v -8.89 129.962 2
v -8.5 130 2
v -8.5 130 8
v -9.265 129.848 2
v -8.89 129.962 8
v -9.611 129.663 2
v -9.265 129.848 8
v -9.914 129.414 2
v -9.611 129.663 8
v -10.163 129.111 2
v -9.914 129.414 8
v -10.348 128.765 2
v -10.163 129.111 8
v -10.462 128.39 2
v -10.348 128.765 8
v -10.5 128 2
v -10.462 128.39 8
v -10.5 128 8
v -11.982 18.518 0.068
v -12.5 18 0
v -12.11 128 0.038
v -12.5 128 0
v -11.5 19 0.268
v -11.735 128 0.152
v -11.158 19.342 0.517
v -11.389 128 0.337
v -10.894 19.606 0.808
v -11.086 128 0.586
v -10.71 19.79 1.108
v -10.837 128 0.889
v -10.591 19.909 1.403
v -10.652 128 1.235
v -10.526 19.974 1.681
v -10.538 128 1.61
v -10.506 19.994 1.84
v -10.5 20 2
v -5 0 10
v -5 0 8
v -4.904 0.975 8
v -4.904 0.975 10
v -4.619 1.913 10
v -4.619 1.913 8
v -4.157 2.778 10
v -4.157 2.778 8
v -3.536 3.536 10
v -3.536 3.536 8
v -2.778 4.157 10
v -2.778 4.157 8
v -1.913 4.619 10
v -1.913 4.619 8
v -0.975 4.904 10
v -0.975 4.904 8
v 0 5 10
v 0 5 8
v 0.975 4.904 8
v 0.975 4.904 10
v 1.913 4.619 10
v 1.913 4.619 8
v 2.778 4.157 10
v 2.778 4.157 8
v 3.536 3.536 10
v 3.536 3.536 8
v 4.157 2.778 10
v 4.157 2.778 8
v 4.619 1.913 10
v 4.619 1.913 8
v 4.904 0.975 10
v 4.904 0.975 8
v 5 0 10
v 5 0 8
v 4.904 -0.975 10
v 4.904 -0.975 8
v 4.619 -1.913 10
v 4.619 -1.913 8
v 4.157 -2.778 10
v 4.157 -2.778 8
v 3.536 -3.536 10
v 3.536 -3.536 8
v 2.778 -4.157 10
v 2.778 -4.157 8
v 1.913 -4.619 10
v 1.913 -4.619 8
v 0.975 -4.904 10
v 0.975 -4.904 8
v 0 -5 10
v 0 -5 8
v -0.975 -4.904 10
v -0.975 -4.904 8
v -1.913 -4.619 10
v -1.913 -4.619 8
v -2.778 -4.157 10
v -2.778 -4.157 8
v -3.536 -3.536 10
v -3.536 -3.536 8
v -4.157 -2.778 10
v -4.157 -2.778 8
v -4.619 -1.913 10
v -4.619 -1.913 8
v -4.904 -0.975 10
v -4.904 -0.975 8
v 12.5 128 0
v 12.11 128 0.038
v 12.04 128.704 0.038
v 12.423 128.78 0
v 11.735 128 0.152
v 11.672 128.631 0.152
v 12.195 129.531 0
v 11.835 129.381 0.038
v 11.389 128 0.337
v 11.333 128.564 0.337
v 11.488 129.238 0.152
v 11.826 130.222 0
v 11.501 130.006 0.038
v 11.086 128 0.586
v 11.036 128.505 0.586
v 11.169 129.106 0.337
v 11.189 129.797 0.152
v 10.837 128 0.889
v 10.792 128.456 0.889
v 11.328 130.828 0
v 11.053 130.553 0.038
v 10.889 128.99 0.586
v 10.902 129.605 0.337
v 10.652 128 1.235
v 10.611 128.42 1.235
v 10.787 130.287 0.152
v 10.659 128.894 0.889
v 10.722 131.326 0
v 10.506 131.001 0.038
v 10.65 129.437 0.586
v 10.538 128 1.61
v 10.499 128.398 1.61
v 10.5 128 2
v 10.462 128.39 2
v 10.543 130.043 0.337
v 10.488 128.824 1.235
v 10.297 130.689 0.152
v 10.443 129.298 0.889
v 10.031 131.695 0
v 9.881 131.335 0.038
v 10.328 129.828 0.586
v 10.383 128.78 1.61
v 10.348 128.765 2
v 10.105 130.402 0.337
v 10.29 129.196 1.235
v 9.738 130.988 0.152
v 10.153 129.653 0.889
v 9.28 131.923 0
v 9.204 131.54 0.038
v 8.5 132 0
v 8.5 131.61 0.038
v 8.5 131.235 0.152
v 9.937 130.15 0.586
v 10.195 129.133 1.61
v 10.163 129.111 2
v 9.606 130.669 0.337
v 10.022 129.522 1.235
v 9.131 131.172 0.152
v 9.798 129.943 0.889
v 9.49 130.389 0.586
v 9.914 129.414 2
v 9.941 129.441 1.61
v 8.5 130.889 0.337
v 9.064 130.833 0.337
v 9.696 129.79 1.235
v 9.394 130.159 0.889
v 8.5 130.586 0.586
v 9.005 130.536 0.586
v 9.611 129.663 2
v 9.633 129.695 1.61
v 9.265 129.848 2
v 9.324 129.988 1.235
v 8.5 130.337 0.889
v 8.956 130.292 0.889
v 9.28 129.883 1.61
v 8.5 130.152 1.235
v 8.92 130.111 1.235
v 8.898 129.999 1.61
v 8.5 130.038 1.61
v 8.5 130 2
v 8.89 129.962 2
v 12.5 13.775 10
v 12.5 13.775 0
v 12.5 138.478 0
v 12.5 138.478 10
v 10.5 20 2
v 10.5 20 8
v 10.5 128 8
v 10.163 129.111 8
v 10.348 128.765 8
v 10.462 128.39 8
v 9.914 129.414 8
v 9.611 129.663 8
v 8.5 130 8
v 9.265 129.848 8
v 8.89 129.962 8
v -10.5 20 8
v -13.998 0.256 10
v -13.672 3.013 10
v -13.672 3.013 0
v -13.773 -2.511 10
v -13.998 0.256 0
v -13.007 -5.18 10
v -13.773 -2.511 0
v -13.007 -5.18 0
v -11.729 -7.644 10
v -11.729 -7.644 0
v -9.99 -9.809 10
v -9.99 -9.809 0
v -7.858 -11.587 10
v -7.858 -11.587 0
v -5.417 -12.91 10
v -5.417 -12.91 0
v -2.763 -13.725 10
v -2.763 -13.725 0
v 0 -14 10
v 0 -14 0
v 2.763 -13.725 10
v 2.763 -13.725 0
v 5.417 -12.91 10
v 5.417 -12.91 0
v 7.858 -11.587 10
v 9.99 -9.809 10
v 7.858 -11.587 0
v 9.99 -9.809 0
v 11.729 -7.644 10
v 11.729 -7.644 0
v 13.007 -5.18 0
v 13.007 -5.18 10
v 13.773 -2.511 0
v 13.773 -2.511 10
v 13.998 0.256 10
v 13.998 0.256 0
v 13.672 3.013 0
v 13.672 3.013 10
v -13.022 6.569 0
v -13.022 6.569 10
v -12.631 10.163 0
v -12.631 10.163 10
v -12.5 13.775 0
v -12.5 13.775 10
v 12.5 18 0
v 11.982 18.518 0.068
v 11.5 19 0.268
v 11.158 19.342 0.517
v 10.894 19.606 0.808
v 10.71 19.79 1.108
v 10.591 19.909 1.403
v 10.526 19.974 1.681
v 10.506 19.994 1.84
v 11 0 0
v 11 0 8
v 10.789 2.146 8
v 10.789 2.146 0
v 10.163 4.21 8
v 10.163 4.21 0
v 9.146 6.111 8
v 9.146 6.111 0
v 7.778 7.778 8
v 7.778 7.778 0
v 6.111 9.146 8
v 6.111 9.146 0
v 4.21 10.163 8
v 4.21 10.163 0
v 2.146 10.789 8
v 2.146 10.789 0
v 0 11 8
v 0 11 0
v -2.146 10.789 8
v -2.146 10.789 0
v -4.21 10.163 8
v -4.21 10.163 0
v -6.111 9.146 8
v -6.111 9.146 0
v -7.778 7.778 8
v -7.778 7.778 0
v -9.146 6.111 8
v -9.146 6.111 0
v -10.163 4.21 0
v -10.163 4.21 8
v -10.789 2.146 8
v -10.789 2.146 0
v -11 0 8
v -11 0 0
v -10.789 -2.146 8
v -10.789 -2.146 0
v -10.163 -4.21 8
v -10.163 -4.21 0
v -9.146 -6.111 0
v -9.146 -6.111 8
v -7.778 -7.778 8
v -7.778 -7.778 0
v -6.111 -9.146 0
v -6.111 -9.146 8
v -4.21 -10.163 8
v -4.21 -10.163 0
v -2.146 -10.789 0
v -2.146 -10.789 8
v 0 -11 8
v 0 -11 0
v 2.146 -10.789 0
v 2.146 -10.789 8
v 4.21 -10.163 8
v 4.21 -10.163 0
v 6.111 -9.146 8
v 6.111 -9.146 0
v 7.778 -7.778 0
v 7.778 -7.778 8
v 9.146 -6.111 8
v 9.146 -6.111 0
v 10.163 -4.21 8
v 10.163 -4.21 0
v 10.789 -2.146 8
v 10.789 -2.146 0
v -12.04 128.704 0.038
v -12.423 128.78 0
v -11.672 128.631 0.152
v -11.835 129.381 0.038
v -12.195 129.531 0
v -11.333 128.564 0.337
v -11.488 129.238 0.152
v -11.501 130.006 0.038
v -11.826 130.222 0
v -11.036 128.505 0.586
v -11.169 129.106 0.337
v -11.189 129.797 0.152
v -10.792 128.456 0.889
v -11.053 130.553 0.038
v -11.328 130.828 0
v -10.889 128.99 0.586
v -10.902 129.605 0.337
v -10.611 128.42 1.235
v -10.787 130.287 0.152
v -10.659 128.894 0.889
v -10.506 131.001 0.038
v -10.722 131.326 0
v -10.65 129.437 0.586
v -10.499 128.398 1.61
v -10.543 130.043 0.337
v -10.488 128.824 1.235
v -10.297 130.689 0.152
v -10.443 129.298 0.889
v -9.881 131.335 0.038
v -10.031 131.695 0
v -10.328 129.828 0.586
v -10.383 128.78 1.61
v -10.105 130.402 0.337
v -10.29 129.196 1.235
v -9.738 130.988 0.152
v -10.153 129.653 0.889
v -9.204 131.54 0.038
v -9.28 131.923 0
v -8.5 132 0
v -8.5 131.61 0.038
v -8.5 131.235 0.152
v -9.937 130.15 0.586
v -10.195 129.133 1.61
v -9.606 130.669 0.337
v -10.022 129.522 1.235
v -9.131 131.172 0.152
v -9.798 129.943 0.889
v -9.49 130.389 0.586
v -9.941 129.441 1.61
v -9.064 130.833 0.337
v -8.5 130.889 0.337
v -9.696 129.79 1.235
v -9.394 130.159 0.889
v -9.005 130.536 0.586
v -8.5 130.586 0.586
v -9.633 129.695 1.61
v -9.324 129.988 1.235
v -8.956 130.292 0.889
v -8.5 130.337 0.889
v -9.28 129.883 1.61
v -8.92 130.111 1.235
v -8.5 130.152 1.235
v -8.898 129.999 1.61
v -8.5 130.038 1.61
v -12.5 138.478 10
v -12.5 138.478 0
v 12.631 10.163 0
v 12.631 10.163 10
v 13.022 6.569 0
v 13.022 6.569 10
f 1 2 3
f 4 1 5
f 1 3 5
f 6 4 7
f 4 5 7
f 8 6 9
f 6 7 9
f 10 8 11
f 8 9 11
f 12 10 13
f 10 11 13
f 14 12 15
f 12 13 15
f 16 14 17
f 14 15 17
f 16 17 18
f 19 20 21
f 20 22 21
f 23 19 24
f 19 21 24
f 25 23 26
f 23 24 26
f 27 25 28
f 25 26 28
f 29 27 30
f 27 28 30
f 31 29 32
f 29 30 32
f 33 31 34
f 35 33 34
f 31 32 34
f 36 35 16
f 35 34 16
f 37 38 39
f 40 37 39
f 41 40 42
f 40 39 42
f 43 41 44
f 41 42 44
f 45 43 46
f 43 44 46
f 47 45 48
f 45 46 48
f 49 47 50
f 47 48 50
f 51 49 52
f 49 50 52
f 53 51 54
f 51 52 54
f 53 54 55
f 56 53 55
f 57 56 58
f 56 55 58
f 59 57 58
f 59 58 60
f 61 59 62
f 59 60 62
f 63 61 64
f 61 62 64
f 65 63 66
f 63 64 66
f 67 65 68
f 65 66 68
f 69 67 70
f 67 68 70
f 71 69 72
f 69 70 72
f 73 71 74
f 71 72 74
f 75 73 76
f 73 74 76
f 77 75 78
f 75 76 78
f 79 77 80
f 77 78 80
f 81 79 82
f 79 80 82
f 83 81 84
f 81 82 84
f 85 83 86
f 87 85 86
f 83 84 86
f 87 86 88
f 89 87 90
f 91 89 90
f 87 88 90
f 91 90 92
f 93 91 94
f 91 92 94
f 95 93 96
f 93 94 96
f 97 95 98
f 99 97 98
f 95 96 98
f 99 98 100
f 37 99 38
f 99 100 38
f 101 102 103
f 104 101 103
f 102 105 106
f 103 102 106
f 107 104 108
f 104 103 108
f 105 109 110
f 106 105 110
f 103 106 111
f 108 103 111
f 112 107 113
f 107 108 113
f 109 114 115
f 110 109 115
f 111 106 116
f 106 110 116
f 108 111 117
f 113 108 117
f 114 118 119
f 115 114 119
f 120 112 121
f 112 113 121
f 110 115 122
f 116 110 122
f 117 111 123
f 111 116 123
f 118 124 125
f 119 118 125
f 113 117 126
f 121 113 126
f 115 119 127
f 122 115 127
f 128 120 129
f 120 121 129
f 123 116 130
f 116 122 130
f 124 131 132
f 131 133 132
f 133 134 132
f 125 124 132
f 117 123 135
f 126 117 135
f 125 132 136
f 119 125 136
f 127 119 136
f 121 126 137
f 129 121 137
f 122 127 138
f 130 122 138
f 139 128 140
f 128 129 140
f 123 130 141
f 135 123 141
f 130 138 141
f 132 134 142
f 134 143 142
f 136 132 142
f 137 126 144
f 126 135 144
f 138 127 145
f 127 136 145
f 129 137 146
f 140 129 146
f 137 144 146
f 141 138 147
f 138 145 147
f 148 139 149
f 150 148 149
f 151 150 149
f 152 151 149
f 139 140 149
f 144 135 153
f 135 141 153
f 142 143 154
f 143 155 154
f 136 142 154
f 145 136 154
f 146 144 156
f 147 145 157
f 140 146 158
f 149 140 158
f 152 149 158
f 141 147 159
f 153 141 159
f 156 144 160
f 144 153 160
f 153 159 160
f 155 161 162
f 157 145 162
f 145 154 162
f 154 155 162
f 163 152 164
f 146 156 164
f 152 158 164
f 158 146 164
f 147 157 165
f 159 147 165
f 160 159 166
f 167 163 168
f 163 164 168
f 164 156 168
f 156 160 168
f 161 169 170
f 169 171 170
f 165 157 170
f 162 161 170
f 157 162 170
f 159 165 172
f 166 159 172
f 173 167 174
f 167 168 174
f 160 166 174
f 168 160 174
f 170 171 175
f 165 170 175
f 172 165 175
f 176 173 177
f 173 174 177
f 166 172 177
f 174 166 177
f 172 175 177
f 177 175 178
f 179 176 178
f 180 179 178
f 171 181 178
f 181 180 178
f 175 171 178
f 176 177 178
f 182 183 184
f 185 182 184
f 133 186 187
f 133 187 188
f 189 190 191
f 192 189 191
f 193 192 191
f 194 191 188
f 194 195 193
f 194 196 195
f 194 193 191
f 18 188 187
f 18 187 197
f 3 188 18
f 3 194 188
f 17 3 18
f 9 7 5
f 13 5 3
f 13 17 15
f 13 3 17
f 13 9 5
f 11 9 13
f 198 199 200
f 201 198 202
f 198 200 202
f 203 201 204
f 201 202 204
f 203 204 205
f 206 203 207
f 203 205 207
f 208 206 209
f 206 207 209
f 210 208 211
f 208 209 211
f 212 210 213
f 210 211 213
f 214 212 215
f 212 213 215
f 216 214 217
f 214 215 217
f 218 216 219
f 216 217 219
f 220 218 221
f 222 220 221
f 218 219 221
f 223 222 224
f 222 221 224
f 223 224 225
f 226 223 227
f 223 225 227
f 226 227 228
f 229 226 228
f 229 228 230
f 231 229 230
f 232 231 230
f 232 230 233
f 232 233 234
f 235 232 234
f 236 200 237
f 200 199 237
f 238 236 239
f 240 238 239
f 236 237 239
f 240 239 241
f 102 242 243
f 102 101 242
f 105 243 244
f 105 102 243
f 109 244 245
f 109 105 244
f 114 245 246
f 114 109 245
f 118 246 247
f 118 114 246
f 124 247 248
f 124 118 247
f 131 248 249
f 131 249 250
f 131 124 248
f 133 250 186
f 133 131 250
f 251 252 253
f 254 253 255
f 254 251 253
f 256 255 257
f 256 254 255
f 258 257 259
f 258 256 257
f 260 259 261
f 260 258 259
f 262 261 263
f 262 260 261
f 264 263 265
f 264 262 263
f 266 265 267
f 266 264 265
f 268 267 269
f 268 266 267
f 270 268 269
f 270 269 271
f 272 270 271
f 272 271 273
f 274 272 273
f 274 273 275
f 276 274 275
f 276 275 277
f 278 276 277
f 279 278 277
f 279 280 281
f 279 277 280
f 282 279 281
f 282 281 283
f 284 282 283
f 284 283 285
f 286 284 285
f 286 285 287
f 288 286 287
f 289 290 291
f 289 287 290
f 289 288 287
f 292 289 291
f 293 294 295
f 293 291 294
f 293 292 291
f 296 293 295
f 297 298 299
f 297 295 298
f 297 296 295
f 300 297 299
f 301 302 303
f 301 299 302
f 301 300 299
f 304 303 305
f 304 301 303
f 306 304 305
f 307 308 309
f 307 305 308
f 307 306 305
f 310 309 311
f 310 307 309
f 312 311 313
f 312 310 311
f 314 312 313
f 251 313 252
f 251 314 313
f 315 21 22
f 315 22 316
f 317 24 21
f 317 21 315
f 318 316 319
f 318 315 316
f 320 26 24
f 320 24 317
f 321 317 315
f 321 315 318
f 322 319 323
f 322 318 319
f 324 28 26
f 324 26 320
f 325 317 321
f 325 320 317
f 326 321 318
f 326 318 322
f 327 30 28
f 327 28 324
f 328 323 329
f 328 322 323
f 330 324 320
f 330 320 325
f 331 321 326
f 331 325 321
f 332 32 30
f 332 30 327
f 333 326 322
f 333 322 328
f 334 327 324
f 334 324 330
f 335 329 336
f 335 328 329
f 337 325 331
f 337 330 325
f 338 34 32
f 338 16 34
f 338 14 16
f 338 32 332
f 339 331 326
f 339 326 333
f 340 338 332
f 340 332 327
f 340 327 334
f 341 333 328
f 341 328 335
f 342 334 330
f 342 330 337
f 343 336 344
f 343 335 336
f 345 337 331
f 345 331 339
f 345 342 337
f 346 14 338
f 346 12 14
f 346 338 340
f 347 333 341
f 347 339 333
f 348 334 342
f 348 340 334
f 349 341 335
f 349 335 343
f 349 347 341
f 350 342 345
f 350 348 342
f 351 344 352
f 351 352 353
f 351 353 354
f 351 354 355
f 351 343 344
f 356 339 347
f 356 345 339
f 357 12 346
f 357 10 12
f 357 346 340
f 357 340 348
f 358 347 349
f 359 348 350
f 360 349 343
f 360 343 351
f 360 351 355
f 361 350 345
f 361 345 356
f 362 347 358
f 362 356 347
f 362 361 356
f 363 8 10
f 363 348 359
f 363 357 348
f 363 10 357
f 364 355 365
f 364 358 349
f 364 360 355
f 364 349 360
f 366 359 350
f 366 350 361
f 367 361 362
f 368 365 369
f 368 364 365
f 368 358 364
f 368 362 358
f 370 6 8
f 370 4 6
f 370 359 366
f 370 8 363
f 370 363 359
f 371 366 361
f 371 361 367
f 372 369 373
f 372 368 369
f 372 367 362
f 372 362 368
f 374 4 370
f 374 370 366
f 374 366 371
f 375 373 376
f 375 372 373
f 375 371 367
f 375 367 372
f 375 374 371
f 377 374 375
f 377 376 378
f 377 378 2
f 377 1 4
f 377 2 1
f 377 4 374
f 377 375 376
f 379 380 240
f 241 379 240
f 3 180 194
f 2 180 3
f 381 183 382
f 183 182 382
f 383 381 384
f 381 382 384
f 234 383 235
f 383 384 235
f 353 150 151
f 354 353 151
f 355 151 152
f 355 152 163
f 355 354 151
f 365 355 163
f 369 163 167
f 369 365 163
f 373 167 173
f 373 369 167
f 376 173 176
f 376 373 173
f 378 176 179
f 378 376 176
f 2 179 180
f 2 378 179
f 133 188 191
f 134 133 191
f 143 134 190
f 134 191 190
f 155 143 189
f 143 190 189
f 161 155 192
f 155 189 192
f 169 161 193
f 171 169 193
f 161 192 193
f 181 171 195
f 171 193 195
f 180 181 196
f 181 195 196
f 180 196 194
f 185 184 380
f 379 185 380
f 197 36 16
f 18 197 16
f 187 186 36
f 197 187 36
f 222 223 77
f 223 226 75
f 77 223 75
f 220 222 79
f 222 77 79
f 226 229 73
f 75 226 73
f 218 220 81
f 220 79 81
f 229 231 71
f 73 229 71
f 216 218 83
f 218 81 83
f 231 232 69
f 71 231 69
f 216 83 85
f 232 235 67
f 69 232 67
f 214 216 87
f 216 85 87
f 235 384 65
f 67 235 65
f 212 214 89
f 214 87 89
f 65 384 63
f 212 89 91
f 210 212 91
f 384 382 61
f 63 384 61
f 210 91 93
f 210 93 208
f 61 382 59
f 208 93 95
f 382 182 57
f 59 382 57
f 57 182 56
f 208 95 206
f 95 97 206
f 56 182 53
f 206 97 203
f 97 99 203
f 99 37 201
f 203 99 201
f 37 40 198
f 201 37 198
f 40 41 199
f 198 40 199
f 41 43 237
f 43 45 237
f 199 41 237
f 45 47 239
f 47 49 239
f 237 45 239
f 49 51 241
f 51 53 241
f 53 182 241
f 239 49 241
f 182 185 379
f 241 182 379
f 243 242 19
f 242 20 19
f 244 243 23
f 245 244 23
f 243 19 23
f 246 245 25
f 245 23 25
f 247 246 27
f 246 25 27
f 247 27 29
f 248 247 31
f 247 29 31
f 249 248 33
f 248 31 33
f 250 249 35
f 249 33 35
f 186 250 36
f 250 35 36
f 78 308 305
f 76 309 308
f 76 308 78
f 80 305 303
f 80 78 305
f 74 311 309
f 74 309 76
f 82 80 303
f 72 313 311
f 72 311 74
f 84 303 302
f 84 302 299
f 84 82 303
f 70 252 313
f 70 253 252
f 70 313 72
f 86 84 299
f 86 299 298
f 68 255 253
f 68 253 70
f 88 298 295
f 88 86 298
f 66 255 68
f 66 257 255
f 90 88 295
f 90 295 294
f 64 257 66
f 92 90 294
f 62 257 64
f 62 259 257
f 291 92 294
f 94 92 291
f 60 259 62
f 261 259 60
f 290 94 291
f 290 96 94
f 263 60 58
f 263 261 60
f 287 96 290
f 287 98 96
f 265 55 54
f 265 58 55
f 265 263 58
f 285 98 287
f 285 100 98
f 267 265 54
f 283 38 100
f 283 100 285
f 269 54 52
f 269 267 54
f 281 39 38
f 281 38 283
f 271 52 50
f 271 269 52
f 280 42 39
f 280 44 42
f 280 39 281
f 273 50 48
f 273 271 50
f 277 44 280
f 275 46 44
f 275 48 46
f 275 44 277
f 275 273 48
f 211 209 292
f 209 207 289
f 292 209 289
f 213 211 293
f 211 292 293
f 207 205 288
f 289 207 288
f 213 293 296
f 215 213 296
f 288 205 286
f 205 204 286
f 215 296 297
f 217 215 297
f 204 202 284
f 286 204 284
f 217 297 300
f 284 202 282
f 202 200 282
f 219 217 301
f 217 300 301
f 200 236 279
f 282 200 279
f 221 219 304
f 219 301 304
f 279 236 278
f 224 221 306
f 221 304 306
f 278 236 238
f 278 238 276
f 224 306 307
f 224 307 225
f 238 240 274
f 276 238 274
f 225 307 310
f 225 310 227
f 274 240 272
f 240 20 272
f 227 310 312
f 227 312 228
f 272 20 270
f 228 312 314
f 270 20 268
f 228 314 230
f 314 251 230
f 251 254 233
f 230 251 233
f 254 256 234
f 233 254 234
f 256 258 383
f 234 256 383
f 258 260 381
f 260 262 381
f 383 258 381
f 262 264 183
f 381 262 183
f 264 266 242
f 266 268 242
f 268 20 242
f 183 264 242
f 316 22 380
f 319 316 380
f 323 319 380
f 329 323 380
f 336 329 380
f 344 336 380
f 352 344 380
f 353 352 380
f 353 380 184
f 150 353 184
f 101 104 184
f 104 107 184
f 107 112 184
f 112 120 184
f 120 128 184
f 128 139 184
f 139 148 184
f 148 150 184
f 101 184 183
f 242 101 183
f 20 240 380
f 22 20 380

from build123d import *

# Parameters (mm, degrees)
SKETCH2_R           = 11
BOSS_EXTRUDE1_DEPTH = 10
BOSS_EXTRUDE3_START = 2
SKETCH6_R           = 11
SKETCH6_R_2         = 5
BOSS_EXTRUDE3_DEPTH = 2
SKETCH11_W          = 21
SKETCH11_H          = 110
CUT_EXTRUDE1_DEPTH  = 8
FILLET2_R           = 50
FILLET3_R           = 2


with BuildPart() as part:
    # Sketch2 → Boss-Extrude1 (new body)
    with BuildSketch(Plane.XY):
        with BuildLine():
            Line((12.5, 138.478281378), (-12.5, 138.478281378))
            Line((-12.5, 138.478281378), (-12.5, 6.304760106))
            ThreePointArc((-12.5, 6.304760106), (0, -14), (12.5, 6.304760106))
            Line((12.5, 6.304760106), (12.5, 138.478281378))
        make_face()
        Circle(SKETCH2_R, mode=Mode.SUBTRACT)
    extrude(amount=BOSS_EXTRUDE1_DEPTH)

    # Sketch6 → Boss-Extrude3 (add)
    with BuildSketch(Plane(origin=(0, 0, 10), x_dir=(-1, 0, 0), z_dir=(0, 0, -1)).offset(BOSS_EXTRUDE3_START)):
        Circle(SKETCH6_R)
        Circle(SKETCH6_R_2, mode=Mode.SUBTRACT)
    extrude(amount=-BOSS_EXTRUDE3_DEPTH)

    # Sketch11 → Cut-Extrude1 (cut)
    with BuildSketch(Plane(origin=(0, 0, 0), x_dir=(-1, 0, 0), z_dir=(0, 0, -1))):
        with Locations((0, 75)):
            Rectangle(SKETCH11_W, SKETCH11_H)
    extrude(amount=-CUT_EXTRUDE1_DEPTH, mode=Mode.SUBTRACT)

    # Fillet2
    fillet2_edges = [part.edges().sort_by_distance(p)[0] for p in [
        (12.5, 6.304760106, 5),
        (-12.5, 6.304760106, 5),
    ]]
    fillet(fillet2_edges, radius=FILLET2_R)

    # Fillet3
    fillet3_edges = [part.edges().sort_by_distance(p)[0] for p in [
        (10.5, 75, 0),
        (0, 20, 0),
        (-10.5, 75, 0),
        (0, 130, 0),
        (-10.5, 130, 4),
        (10.5, 130, 4),
    ]]
    fillet(fillet3_edges, radius=FILLET3_R - 0.0001)  # a hair under: the kernel refuses the full size


solid = part.part
